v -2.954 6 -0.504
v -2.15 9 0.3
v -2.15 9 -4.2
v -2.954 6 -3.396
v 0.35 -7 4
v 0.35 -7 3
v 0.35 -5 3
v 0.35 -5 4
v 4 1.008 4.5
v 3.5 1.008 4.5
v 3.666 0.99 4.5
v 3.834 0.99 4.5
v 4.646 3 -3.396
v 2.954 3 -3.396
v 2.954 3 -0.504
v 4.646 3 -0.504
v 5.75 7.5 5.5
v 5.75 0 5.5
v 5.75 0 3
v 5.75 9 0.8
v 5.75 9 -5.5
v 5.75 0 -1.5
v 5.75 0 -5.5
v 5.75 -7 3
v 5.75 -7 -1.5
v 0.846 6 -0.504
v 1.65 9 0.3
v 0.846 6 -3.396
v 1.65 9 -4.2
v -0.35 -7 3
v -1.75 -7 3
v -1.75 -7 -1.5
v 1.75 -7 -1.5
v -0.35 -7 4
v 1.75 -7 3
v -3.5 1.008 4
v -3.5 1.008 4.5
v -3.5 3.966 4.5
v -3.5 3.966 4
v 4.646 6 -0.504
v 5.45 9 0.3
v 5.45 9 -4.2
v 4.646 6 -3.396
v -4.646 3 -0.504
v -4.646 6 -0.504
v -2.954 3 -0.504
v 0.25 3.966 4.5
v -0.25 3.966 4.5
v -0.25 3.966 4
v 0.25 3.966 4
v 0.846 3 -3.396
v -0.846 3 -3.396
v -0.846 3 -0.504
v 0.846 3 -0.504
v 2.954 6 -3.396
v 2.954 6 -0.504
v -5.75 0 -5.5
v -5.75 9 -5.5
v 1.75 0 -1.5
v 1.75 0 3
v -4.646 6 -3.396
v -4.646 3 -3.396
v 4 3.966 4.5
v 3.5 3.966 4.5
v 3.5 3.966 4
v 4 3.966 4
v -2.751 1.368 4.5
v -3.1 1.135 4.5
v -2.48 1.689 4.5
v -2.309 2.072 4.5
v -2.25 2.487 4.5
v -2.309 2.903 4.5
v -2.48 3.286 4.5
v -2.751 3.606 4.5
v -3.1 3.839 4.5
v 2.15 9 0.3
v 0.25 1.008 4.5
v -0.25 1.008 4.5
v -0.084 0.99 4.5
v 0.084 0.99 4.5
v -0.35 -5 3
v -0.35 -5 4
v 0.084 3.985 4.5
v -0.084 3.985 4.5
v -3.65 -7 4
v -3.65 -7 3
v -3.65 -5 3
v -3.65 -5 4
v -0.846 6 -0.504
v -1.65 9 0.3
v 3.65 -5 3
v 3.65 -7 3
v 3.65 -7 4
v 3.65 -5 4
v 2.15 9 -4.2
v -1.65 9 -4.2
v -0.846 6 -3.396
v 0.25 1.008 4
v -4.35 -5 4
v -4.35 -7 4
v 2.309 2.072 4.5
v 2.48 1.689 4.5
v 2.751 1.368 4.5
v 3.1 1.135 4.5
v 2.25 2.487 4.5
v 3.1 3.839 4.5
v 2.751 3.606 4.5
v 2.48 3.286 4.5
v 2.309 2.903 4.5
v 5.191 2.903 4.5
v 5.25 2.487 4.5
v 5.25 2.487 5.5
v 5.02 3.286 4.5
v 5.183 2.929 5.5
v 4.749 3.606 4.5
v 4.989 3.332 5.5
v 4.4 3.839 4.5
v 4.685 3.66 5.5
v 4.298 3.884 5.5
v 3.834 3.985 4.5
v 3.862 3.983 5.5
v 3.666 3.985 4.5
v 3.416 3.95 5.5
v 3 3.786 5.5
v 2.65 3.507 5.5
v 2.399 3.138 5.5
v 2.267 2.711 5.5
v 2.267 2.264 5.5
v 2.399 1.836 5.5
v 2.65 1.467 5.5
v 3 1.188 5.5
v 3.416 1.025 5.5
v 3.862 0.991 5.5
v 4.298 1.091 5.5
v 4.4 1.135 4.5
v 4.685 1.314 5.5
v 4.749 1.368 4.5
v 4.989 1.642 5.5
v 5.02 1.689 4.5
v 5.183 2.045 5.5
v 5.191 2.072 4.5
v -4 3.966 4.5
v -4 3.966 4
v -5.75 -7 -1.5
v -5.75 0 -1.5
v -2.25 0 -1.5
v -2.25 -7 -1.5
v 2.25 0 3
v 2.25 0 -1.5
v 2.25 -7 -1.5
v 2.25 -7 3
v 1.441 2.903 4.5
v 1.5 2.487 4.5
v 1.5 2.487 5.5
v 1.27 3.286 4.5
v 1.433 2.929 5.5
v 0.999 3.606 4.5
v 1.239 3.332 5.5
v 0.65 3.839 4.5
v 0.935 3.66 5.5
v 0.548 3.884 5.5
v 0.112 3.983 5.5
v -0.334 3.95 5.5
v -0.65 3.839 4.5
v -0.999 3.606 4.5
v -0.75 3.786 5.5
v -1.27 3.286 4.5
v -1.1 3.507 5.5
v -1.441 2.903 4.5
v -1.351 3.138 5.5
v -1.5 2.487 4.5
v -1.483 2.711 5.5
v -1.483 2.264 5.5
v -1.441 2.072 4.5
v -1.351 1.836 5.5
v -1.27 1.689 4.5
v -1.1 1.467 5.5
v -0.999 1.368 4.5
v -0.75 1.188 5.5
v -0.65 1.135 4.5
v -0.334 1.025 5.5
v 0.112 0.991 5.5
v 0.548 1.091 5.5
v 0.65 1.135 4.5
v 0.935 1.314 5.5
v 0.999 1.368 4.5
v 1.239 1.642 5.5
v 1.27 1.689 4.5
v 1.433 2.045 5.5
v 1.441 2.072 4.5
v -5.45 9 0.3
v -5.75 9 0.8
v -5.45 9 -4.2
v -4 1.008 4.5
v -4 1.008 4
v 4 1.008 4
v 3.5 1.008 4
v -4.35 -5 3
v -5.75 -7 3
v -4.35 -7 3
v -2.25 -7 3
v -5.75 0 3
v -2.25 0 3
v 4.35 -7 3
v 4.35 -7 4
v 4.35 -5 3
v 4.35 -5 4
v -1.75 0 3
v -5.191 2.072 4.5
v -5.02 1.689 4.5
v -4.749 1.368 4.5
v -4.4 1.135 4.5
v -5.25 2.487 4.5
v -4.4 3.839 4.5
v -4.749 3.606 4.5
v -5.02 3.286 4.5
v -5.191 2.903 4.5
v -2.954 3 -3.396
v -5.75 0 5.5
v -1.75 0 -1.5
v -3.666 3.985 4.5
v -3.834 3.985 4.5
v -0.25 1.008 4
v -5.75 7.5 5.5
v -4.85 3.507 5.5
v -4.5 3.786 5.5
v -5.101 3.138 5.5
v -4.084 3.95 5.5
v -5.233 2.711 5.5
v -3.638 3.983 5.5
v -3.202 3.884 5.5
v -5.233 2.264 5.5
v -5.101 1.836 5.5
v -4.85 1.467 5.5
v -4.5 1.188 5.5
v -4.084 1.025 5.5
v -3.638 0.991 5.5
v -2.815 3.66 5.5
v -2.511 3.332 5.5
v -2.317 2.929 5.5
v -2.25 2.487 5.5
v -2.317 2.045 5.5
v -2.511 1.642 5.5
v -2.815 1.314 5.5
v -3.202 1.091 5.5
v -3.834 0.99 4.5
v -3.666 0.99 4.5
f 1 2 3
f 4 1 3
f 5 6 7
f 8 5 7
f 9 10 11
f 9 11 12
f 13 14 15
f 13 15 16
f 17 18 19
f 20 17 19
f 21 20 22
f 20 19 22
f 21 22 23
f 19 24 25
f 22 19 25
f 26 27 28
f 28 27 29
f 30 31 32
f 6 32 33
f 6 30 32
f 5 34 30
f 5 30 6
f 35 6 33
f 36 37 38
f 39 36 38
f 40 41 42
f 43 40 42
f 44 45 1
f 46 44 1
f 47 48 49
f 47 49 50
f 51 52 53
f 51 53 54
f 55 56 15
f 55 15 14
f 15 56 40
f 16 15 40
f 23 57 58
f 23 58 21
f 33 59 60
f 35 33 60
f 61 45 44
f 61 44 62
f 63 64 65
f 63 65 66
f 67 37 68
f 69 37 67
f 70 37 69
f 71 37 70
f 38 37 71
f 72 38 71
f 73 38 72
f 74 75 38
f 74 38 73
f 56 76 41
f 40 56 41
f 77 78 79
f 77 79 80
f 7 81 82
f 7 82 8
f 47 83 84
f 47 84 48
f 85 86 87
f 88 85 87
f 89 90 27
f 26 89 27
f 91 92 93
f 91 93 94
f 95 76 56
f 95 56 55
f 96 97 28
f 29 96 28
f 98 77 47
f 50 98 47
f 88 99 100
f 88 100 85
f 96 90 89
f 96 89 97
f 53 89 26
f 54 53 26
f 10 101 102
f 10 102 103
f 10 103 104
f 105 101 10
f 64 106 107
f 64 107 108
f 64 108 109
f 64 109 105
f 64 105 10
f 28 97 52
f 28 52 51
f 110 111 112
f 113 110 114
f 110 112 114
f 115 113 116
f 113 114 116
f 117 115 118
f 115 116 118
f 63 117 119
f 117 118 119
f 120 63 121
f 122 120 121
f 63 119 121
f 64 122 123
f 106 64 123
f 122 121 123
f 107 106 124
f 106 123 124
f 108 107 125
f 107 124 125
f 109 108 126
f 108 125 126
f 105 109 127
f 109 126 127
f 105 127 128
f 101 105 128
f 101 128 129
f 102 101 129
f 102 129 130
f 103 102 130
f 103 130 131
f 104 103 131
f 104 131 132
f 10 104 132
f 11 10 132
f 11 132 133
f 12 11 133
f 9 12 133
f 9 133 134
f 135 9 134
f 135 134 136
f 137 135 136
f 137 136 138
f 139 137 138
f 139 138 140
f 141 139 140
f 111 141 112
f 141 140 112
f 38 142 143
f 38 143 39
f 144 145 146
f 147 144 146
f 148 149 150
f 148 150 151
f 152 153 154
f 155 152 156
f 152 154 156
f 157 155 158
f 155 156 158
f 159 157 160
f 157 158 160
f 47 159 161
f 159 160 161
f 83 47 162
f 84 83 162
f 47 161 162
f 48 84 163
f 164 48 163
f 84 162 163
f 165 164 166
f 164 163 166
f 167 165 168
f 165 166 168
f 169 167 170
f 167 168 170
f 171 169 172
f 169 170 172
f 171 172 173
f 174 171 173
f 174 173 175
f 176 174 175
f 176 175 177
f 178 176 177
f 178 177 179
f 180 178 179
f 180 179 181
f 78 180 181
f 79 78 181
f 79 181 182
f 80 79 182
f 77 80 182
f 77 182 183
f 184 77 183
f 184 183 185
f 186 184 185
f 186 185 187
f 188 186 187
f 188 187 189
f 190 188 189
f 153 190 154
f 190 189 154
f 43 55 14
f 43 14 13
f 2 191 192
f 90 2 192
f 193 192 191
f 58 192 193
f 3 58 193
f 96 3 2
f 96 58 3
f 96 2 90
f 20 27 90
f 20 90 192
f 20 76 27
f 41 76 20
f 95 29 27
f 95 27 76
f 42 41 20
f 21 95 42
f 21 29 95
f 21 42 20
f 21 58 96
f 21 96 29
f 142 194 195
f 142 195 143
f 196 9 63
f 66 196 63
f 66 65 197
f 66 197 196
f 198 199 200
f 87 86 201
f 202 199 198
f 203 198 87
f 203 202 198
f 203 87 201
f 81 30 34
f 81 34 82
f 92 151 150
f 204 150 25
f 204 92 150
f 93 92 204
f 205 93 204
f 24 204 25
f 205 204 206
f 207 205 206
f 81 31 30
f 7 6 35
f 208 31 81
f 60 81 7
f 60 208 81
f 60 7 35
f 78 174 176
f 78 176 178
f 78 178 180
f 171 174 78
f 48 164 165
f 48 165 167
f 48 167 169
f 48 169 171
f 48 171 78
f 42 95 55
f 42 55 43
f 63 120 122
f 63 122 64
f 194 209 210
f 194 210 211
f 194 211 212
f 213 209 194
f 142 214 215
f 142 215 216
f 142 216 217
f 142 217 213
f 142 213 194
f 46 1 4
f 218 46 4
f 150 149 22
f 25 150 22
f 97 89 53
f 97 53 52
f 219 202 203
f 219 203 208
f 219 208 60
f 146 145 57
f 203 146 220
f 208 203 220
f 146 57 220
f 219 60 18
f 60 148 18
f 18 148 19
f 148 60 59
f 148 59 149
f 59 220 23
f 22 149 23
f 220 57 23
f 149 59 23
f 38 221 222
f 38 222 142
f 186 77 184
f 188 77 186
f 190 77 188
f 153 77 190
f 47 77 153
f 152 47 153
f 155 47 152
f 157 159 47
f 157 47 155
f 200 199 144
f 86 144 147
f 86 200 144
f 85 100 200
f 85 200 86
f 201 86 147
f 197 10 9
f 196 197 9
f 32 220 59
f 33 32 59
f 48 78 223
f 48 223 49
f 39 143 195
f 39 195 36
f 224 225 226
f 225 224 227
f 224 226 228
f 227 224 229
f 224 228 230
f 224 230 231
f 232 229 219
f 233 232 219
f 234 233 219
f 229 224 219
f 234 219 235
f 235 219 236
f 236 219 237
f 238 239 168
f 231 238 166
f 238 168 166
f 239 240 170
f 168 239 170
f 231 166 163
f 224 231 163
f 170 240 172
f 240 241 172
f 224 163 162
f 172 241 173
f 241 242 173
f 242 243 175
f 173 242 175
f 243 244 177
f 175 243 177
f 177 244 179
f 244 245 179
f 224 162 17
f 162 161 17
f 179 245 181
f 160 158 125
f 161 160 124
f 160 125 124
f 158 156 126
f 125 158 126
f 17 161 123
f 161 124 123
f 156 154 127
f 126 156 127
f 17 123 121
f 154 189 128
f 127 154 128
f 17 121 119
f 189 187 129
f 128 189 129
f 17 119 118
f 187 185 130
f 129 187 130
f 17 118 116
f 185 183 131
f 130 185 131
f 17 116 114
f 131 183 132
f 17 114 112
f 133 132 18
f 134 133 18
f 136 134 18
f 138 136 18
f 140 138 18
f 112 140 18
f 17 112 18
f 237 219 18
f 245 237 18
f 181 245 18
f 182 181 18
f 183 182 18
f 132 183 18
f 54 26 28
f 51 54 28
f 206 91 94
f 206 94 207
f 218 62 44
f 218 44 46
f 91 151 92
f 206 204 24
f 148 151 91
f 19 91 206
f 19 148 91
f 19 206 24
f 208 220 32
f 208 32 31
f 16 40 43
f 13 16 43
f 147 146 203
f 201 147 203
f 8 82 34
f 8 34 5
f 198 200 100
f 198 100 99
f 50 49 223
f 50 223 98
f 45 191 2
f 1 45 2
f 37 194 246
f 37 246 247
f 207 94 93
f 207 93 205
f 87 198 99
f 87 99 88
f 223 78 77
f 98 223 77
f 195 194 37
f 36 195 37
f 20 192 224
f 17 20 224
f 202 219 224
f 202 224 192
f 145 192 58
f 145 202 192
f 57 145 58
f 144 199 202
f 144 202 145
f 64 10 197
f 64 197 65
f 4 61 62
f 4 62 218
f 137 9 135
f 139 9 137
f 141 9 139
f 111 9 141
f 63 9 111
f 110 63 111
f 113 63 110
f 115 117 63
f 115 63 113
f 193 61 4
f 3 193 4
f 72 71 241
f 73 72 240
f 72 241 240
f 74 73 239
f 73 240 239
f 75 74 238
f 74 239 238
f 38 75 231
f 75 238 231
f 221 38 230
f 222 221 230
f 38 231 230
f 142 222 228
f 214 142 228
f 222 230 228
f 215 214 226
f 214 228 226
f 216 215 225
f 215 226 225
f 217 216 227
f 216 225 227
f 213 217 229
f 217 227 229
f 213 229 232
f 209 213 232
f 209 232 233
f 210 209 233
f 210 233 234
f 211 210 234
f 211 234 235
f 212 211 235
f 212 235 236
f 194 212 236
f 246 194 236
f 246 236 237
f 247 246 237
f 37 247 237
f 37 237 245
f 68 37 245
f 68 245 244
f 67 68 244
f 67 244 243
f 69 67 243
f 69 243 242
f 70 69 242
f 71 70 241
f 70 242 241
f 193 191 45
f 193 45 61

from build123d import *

# Parameters (mm, degrees)
SKETCH1_W                    = 11.5
SKETCH1_H                    = 11
BOSS_EXTRUDE1_DEPTH          = 9
SKETCH2_W                    = 3.5
SKETCH2_H                    = 4.5
BOSS_EXTRUDE2_DEPTH          = 7
SKETCH3_W                    = 3.3
SKETCH3_H                    = 4.5
CUT_EXTRUDE1_DEPTH           = 3
CUT_EXTRUDE1_DRAFT           = -15
CUT_EXTRUDE1_PROFILE_2_DEPTH = 3
CUT_EXTRUDE1_PROFILE_2_DRAFT = -15
CUT_EXTRUDE1_PROFILE_3_DEPTH = 3
CUT_EXTRUDE1_PROFILE_3_DRAFT = -15
SKETCH4_W                    = 1.692304846
SKETCH4_H                    = 2.892304846
CUT_EXTRUDE2_DEPTH           = 3
CUT_EXTRUDE3_DEPTH           = 17
SKETCH6_R                    = 1.5
CUT_EXTRUDE4_DEPTH           = 1
SKETCH7_W                    = 0.5
SKETCH7_H                    = 2.958039891
CUT_EXTRUDE5_DEPTH           = 0.5
SKETCH8_W                    = 0.7
SKETCH8_H                    = 2
BOSS_EXTRUDE3_DEPTH          = 1


with BuildPart() as part:
    # Sketch1 → Boss-Extrude1 (new body)
    with BuildSketch(Plane(origin=(0, 0, 0), x_dir=(1, 0, 0), z_dir=(0, 1, 0))):
        Rectangle(SKETCH1_W, SKETCH1_H)
    extrude(amount=BOSS_EXTRUDE1_DEPTH)

    # Sketch2 → Boss-Extrude2 (add)
    with BuildSketch(Plane.XZ):
        with Locations((-4, 0.75)):
            Rectangle(SKETCH2_W, SKETCH2_H)
        with Locations((4, 0.75)):
            Rectangle(SKETCH2_W, SKETCH2_H)
        with Locations((0, 0.75)):
            Rectangle(SKETCH2_W, SKETCH2_H)
    extrude(amount=BOSS_EXTRUDE2_DEPTH)


with BuildPart() as cut_extrude1_tool:
    # Sketch3 → Cut-Extrude1 (with draft: the straight prism first)
    with BuildSketch(Plane(origin=(0, 9, 0), x_dir=(1, 0, 0), z_dir=(0, 1, 0))):
        with Locations((3.8, 1.95)):
            Rectangle(SKETCH3_W, SKETCH3_H)
    extrude(amount=-CUT_EXTRUDE1_DEPTH)
    # Cut-Extrude1: the draft: its side faces are tilted about the plane it starts from
    cut_extrude1_sides = [cut_extrude1_tool.faces().sort_by_distance(p)[0] for p in [
        (3.8, 7.5, -4.2),
        (2.15, 7.5, -1.95),
        (3.8, 7.5, 0.3),
        (5.45, 7.5, -1.95),
    ]]
    draft(cut_extrude1_sides, Plane(origin=(0, 9, 0), x_dir=(1, 0, 0), z_dir=(0, 1, 0)), CUT_EXTRUDE1_DRAFT)


with BuildPart() as part_1:
    add(part.part)

    # Cut-Extrude1: cut by cut_extrude1_tool
    add(cut_extrude1_tool.part, mode=Mode.SUBTRACT)


with BuildPart() as cut_extrude1_profile_2_tool:
    # Sketch3 → Cut-Extrude1 profile 2 (with draft: the straight prism first)
    with BuildSketch(Plane(origin=(0, 9, 0), x_dir=(1, 0, 0), z_dir=(0, 1, 0))):
        with Locations((-3.8, 1.95)):
            Rectangle(SKETCH3_W, SKETCH3_H)
    extrude(amount=-CUT_EXTRUDE1_PROFILE_2_DEPTH)
    # Cut-Extrude1 profile 2: the draft: its side faces are tilted about the plane it starts from
    cut_extrude1_profile_2_sides = [cut_extrude1_profile_2_tool.faces().sort_by_distance(p)[0] for p in [
        (-3.8, 7.5, -4.2),
        (-5.45, 7.5, -1.95),
        (-3.8, 7.5, 0.3),
        (-2.15, 7.5, -1.95),
    ]]
    draft(cut_extrude1_profile_2_sides, Plane(origin=(0, 9, 0), x_dir=(1, 0, 0), z_dir=(0, 1, 0)), CUT_EXTRUDE1_PROFILE_2_DRAFT)


with BuildPart() as part_2:
    add(part_1.part)

    # Cut-Extrude1 profile 2: cut by cut_extrude1_profile_2_tool
    add(cut_extrude1_profile_2_tool.part, mode=Mode.SUBTRACT)


with BuildPart() as cut_extrude1_profile_3_tool:
    # Sketch3 → Cut-Extrude1 profile 3 (with draft: the straight prism first)
    with BuildSketch(Plane(origin=(0, 9, 0), x_dir=(1, 0, 0), z_dir=(0, 1, 0))):
        with Locations((0, 1.95)):
            Rectangle(SKETCH3_W, SKETCH3_H)
    extrude(amount=-CUT_EXTRUDE1_PROFILE_3_DEPTH)
    # Cut-Extrude1 profile 3: the draft: its side faces are tilted about the plane it starts from
    cut_extrude1_profile_3_sides = [cut_extrude1_profile_3_tool.faces().sort_by_distance(p)[0] for p in [
        (-1.65, 7.5, -1.95),
        (0, 7.5, 0.3),
        (1.65, 7.5, -1.95),
        (0, 7.5, -4.2),
    ]]
    draft(cut_extrude1_profile_3_sides, Plane(origin=(0, 9, 0), x_dir=(1, 0, 0), z_dir=(0, 1, 0)), CUT_EXTRUDE1_PROFILE_3_DRAFT)


with BuildPart() as part_3:
    add(part_2.part)

    # Cut-Extrude1 profile 3: cut by cut_extrude1_profile_3_tool
    add(cut_extrude1_profile_3_tool.part, mode=Mode.SUBTRACT)

    # Sketch4 → Cut-Extrude2 (cut)
    with BuildSketch(Plane(origin=(0, 6, 0), x_dir=(1, 0, 0), z_dir=(0, 1, 0))):
        with Locations((-3.8, 1.95)):
            Rectangle(SKETCH4_W, SKETCH4_H)
        with Locations((3.8, 1.95)):
            Rectangle(SKETCH4_W, SKETCH4_H)
        with Locations((0, 1.95)):
            Rectangle(SKETCH4_W, SKETCH4_H)
    extrude(amount=-CUT_EXTRUDE2_DEPTH, mode=Mode.SUBTRACT)

    # Sketch5 → Cut-Extrude3 (cut)
    with BuildSketch(Plane.ZY.offset(5.75)):
        Polygon((5.5, 9), (0.8, 9), (5.5, 7.5), align=None)
    extrude(amount=-CUT_EXTRUDE3_DEPTH, mode=Mode.SUBTRACT)

    # Sketch6 → Cut-Extrude4 (cut)
    with BuildSketch(Plane.XY.offset(5.5)):
        with Locations((-3.75, 2.487199689)):
            Circle(SKETCH6_R)
        with Locations((0, 2.487199689)):
            Circle(SKETCH6_R)
        with Locations((3.75, 2.487199689)):
            Circle(SKETCH6_R)
    extrude(amount=-CUT_EXTRUDE4_DEPTH, mode=Mode.SUBTRACT)

    # Sketch7 → Cut-Extrude5 (cut)
    with BuildSketch(Plane.XY.offset(4.5)):
        with Locations((-3.75, 2.487199689)):
            Rectangle(SKETCH7_W, SKETCH7_H)
        with Locations((0, 2.487199689)):
            Rectangle(SKETCH7_W, SKETCH7_H)
        with Locations((3.75, 2.487199689)):
            Rectangle(SKETCH7_W, SKETCH7_H)
    extrude(amount=-CUT_EXTRUDE5_DEPTH, mode=Mode.SUBTRACT)

    # Sketch8 → Boss-Extrude3 (add)
    with BuildSketch(Plane.XY.offset(3)):
        with Locations((4, -6)):
            Rectangle(SKETCH8_W, SKETCH8_H)
        with Locations((-4, -6)):
            Rectangle(SKETCH8_W, SKETCH8_H)
        with Locations((0, -6)):
            Rectangle(SKETCH8_W, SKETCH8_H)
    extrude(amount=BOSS_EXTRUDE3_DEPTH)


solid = part_3.part
